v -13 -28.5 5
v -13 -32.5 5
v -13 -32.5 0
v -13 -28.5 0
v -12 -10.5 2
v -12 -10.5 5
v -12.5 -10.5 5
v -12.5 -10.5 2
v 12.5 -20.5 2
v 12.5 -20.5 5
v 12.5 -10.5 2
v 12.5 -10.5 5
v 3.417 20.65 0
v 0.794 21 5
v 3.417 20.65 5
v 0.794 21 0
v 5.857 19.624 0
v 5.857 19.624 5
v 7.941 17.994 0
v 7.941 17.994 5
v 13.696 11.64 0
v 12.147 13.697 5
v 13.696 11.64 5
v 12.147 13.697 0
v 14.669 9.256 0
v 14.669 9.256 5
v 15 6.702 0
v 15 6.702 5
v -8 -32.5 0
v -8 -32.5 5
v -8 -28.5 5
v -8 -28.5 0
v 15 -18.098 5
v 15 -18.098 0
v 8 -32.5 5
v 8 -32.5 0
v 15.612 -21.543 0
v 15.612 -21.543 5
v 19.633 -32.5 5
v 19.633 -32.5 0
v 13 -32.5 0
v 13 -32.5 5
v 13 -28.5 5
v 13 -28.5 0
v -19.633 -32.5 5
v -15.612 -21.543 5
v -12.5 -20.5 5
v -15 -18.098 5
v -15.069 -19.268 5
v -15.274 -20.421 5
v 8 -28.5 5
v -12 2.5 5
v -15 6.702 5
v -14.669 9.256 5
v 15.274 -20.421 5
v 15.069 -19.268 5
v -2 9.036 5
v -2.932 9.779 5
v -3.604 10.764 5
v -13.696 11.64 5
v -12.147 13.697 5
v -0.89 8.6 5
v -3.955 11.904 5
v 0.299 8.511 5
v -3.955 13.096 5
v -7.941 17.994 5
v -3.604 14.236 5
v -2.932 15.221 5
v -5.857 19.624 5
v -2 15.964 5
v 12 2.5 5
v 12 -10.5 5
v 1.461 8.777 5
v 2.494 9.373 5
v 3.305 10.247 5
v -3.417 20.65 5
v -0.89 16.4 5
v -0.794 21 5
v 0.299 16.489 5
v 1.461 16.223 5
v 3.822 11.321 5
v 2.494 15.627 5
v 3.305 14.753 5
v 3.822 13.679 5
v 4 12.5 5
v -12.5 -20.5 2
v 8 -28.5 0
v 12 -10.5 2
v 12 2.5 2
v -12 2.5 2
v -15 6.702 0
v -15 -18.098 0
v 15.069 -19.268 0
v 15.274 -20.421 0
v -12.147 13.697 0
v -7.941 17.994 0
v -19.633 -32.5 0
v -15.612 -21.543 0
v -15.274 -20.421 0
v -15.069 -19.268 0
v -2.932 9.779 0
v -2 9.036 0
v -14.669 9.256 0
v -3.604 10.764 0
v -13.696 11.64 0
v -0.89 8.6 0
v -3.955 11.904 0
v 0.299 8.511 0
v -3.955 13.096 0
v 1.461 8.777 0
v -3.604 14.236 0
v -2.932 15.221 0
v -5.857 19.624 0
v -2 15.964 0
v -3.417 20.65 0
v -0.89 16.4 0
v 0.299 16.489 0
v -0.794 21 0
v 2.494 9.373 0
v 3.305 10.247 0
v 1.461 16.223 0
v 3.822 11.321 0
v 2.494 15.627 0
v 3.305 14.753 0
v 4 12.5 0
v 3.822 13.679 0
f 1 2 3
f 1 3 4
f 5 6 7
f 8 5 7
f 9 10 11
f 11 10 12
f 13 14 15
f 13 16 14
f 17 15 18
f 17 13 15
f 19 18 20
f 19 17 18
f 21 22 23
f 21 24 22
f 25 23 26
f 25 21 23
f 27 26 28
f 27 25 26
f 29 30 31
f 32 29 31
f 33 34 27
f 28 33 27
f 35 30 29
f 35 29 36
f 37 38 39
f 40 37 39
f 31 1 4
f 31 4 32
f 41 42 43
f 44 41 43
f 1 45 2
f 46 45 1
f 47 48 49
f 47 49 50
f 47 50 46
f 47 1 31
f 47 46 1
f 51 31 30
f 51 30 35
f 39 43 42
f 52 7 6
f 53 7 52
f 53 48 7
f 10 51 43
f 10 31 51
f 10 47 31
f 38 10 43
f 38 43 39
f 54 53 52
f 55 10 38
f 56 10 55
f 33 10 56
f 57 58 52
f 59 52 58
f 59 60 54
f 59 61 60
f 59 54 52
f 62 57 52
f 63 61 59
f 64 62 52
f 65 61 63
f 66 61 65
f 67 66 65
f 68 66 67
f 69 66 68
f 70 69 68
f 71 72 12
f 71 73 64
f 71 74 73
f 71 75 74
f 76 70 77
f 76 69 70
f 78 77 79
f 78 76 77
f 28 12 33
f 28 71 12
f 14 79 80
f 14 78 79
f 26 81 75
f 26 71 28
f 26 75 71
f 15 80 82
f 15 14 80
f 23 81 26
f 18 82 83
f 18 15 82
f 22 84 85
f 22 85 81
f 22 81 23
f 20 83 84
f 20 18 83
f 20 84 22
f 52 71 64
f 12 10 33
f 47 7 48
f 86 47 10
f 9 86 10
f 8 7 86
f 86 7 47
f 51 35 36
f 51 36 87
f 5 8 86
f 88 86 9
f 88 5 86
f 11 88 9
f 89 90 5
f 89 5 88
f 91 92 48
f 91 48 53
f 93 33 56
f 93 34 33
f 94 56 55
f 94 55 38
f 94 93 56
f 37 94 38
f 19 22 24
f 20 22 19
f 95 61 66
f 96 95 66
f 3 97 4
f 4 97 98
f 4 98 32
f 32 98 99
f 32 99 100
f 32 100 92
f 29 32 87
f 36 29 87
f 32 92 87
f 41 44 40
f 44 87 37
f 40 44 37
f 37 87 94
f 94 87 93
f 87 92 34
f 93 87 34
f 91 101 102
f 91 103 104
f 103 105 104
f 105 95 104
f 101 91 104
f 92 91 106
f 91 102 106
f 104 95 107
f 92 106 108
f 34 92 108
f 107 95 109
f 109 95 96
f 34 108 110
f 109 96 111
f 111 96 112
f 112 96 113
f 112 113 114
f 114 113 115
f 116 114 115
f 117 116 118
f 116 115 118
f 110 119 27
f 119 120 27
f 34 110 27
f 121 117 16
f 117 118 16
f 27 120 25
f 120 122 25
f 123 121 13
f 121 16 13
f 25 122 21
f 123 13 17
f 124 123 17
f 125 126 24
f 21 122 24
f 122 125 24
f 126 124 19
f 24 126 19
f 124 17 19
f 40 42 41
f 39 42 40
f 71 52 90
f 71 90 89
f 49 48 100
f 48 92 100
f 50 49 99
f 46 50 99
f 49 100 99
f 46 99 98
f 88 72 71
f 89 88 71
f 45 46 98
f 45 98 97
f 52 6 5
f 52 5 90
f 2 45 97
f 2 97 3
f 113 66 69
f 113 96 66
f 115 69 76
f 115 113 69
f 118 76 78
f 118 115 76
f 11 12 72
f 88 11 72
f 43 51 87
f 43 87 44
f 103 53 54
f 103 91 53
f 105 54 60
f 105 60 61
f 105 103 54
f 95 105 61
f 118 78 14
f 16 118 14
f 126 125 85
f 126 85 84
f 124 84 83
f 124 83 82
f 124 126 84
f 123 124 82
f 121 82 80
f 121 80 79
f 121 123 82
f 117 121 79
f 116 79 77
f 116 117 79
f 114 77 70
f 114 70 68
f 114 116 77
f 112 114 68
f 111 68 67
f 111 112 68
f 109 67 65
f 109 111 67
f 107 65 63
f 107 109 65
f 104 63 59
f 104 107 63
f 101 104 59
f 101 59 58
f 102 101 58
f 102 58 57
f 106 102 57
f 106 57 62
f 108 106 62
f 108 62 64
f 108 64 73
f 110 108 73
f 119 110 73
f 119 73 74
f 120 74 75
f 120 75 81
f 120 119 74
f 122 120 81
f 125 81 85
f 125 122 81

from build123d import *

# Parameters (mm, degrees)
ESQUISSE1_W             = 30
ESQUISSE1_H             = 67
ESQUISSE1_R             = 4
BOSS_EXTRU_1_DEPTH      = 5
ESQUISSE2_W             = 30
ESQUISSE2_H             = 12.5
ENL_V_MAT_EXTRU_1_DEPTH = 5
ESQUISSE3_W             = 5
ESQUISSE3_H             = 5
ENL_V_MAT_EXTRU_2_DEPTH = 38.043892884
BOSS_EXTRU_2_DEPTH      = 5
ENL_V_MAT_EXTRU_3_DEPTH = 40.33509883
ESQUISSE8_W             = 41.113396405
ESQUISSE8_H             = 1
ENL_V_MAT_EXTRU_4_DEPTH = 40.33509883
CONG_1_R                = 10
CONG_2_R                = 10
ESQUISSE9_W             = 24
ESQUISSE9_H             = 13
ENL_V_MAT_EXTRU_5_DEPTH = 3


with BuildPart() as part:
    # Esquisse1 → Boss.-Extru.1 (new body)
    with BuildSketch(Plane.XY):
        Rectangle(ESQUISSE1_W, ESQUISSE1_H)
        with Locations((0, 12.5)):
            Circle(ESQUISSE1_R, mode=Mode.SUBTRACT)
    extrude(amount=BOSS_EXTRU_1_DEPTH)

    # Esquisse2 → Enlèv. mat.-Extru.1 (cut)
    with BuildSketch(Plane.XY.offset(5)):
        with Locations((0, 27.25)):
            Rectangle(ESQUISSE2_W, ESQUISSE2_H)
    extrude(amount=-ENL_V_MAT_EXTRU_1_DEPTH, mode=Mode.SUBTRACT)

    # Esquisse3 → Enlèv. mat.-Extru.2 (cut, through all)
    with BuildSketch(Plane.XY.offset(5)):
        with Locations((-10.5, -31)):
            Rectangle(ESQUISSE3_W, ESQUISSE3_H)
        with Locations((10.5, -31)):
            Rectangle(ESQUISSE3_W, ESQUISSE3_H)
    extrude(amount=-ENL_V_MAT_EXTRU_2_DEPTH, mode=Mode.SUBTRACT)

    # Esquisse5 → Boss.-Extru.2 (add)
    with BuildSketch(Plane.XY.offset(5)):
        Polygon((-15, -19.875), (-20, -33.5), (-15, -33.5), align=None)
        Polygon((15, -19.875), (20, -33.5), (15, -33.5), align=None)
    extrude(amount=-BOSS_EXTRU_2_DEPTH)

    # Esquisse6 → Enlèv. mat.-Extru.3 (cut, through all)
    with BuildSketch(Plane.XY.offset(5)):
        Polygon((-15, 10.78125), (-5, 21), (-15, 21), align=None)
        Polygon((15, 10.78125), (5, 21), (15, 21), align=None)
    extrude(amount=-ENL_V_MAT_EXTRU_3_DEPTH, mode=Mode.SUBTRACT)

    # Esquisse8 → Enlèv. mat.-Extru.4 (cut, through all)
    with BuildSketch(Plane.XY.offset(5)):
        with Locations((0.556698202, -33)):
            Rectangle(ESQUISSE8_W, ESQUISSE8_H)
    extrude(amount=-ENL_V_MAT_EXTRU_4_DEPTH, mode=Mode.SUBTRACT)

    # Congé1
    cong_1_edges = [part.edges().sort_by_distance(p)[0] for p in [
        (-15, 10.78125, 2.5),
        (-5, 21, 2.5),
        (15, 10.78125, 2.5),
        (5, 21, 2.5),
    ]]
    fillet(cong_1_edges, radius=CONG_1_R)

    # Congé2
    cong_2_edges = [part.edges().sort_by_distance(p)[0] for p in [
        (-15, -19.875, 2.5),
        (15, -19.875, 2.5),
    ]]
    fillet(cong_2_edges, radius=CONG_2_R)

    # Esquisse9 → Enlèv. mat.-Extru.5 (cut)
    with BuildSketch(Plane.XY.offset(5)):
        with Locations((0, -4)):
            Rectangle(ESQUISSE9_W, ESQUISSE9_H)
        Polygon((12, -10.5), (-12, -10.5), (-12.5, -10.5), (-12.5, -20.5), (12.5, -20.5), (12.5, -10.5), align=None)
    extrude(amount=-ENL_V_MAT_EXTRU_5_DEPTH, mode=Mode.SUBTRACT)


solid = part.part
